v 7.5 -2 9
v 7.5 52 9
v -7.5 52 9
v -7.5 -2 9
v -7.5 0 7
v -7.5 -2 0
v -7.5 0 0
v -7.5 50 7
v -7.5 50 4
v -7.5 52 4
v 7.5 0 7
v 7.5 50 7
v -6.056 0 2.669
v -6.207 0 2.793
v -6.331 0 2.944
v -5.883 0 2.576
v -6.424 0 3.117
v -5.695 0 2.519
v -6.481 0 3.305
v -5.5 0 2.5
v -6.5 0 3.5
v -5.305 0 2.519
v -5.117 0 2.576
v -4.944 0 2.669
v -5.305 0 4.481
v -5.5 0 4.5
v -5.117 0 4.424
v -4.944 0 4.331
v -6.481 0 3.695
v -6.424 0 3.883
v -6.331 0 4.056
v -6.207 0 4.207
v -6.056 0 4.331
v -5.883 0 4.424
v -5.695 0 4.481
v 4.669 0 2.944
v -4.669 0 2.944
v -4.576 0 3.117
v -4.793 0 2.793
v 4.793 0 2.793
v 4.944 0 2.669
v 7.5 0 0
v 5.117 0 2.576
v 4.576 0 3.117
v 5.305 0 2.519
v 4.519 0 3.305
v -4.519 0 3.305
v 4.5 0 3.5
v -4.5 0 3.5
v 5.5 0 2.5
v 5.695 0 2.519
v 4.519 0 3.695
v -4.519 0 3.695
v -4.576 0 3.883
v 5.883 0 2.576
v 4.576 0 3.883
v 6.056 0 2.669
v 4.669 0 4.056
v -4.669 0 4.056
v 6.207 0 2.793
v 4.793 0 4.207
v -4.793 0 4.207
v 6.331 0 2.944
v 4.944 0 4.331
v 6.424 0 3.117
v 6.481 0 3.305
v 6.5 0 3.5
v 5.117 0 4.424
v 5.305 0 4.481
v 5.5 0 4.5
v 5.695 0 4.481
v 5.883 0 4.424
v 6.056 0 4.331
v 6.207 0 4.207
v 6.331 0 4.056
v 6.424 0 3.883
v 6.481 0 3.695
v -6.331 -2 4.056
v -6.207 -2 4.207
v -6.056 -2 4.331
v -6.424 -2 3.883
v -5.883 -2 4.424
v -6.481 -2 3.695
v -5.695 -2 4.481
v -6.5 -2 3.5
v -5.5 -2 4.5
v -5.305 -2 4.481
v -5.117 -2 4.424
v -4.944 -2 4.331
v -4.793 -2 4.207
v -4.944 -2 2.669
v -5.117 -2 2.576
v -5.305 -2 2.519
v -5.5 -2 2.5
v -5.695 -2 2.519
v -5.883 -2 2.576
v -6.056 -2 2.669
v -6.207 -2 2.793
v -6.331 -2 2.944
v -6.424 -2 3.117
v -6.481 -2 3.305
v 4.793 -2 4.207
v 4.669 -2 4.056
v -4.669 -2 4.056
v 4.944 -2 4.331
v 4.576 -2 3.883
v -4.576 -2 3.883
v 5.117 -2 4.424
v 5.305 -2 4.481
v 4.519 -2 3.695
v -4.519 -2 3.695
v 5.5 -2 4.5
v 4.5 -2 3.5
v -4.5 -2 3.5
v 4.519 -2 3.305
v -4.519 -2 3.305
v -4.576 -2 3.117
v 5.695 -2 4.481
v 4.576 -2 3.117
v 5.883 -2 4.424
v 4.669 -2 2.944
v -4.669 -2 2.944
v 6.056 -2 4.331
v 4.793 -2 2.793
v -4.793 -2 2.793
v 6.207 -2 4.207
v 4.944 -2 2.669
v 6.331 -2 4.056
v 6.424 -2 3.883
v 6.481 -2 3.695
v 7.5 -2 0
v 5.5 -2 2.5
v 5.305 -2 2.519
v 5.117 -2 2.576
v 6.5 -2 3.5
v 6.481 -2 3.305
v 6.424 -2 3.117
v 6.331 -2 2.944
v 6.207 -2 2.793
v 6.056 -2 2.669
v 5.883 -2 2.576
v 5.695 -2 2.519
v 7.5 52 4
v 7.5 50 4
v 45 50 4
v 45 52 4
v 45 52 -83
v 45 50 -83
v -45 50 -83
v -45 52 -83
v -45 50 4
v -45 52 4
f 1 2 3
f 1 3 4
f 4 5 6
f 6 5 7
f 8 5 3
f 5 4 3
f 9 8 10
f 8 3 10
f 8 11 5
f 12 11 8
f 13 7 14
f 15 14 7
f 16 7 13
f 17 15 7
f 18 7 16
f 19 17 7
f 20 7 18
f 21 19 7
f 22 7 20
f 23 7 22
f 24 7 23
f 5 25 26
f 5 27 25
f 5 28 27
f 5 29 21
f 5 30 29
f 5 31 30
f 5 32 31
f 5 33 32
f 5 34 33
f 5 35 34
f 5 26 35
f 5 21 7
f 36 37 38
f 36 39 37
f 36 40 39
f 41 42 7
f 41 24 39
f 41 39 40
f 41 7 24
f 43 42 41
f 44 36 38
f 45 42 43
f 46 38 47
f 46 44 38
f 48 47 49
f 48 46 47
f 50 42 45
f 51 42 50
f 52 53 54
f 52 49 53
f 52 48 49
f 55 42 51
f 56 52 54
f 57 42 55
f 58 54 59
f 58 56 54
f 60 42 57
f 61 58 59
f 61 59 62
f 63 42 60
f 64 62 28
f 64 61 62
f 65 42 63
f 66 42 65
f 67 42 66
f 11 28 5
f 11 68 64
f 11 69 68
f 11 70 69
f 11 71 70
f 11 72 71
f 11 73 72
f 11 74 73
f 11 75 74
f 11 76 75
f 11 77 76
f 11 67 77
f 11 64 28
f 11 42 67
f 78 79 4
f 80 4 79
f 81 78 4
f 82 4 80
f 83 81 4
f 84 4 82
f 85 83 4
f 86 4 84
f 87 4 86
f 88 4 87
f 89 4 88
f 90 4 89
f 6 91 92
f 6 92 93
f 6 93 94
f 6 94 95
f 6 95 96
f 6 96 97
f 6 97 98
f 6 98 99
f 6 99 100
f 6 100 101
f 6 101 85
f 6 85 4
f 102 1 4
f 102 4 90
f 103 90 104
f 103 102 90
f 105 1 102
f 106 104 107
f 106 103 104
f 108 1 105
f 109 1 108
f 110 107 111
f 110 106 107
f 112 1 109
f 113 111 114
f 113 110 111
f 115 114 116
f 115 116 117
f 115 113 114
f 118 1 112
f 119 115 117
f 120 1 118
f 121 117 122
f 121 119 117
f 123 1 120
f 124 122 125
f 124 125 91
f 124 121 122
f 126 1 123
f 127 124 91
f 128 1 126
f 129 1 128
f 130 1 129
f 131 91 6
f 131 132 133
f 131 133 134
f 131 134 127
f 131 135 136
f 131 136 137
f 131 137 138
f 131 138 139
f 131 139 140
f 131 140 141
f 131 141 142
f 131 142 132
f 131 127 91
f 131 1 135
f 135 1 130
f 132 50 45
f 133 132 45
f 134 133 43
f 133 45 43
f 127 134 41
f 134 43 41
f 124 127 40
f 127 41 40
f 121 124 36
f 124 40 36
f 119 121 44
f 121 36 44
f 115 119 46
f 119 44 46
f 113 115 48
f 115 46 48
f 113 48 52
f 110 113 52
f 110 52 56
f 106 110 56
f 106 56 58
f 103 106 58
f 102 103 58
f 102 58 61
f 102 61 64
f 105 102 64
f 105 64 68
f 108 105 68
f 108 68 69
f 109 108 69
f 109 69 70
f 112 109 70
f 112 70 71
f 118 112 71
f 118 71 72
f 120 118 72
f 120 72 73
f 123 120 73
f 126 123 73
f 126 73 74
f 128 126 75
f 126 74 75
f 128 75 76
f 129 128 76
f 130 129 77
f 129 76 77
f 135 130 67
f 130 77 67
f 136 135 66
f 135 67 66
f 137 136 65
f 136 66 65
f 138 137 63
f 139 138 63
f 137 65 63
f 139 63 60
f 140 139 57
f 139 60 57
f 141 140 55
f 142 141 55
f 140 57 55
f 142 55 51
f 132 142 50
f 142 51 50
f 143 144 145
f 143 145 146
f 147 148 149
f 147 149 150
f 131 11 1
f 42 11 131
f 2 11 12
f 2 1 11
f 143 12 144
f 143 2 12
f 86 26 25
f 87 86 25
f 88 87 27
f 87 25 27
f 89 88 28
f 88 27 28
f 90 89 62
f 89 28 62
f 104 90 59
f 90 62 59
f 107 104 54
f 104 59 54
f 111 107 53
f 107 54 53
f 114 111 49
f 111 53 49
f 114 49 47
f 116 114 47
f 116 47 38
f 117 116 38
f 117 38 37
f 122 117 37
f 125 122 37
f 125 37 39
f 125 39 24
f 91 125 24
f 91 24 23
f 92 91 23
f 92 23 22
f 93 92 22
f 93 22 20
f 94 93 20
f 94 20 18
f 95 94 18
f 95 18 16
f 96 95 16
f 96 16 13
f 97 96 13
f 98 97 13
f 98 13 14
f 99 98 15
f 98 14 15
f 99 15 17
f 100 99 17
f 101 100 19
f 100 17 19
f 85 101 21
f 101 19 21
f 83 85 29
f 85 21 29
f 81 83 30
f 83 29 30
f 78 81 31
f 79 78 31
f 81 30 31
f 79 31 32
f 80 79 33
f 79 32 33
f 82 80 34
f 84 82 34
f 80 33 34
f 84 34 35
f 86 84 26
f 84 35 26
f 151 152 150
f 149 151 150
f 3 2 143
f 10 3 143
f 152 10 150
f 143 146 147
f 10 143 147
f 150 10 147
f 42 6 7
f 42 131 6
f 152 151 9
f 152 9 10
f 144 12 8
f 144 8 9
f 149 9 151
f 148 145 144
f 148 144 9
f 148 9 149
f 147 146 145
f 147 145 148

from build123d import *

# Parameters (mm, degrees)
BOSS_EXTRUDE1_DEPTH = 7.5
SKETCH1_4_W         = 87
SKETCH1_4_H         = 2
BOSS_EXTRUDE2_DEPTH = 45
SKETCH2_R           = 1
CUT_EXTRUDE1_DEPTH  = 108.786826653


with BuildPart() as part:
    # Sketch1 → Boss-Extrude1 (new, symmetric)
    with BuildSketch(Plane(origin=(0, 0, 0), x_dir=(0, 0, -1), z_dir=(1, 0, 0))):
        Polygon((0, 0), (-7, 0), (-7, 50), (83, 50), (83, 52), (-9, 52), (-9, -2), (0, -2), align=None)
    extrude(amount=BOSS_EXTRUDE1_DEPTH, both=True)

    # Sketch1<4> → Boss-Extrude2 (add, symmetric)
    with BuildSketch(Plane(origin=(0, 0, 0), x_dir=(0, 0, -1), z_dir=(1, 0, 0))):
        with Locations((39.5, 51)):
            Rectangle(SKETCH1_4_W, SKETCH1_4_H)
    extrude(amount=BOSS_EXTRUDE2_DEPTH, both=True)

    # Sketch2 → Cut-Extrude1 (cut, through all)
    with BuildSketch(Plane(origin=(0, 0, 0), x_dir=(1, 0, 0), z_dir=(0, 1, 0))):
        with Locations((-5.5, -3.5)):
            Circle(SKETCH2_R)
        with Locations((5.5, -3.5)):
            Circle(SKETCH2_R)
    extrude(amount=-CUT_EXTRUDE1_DEPTH, mode=Mode.SUBTRACT)


solid = part.part
